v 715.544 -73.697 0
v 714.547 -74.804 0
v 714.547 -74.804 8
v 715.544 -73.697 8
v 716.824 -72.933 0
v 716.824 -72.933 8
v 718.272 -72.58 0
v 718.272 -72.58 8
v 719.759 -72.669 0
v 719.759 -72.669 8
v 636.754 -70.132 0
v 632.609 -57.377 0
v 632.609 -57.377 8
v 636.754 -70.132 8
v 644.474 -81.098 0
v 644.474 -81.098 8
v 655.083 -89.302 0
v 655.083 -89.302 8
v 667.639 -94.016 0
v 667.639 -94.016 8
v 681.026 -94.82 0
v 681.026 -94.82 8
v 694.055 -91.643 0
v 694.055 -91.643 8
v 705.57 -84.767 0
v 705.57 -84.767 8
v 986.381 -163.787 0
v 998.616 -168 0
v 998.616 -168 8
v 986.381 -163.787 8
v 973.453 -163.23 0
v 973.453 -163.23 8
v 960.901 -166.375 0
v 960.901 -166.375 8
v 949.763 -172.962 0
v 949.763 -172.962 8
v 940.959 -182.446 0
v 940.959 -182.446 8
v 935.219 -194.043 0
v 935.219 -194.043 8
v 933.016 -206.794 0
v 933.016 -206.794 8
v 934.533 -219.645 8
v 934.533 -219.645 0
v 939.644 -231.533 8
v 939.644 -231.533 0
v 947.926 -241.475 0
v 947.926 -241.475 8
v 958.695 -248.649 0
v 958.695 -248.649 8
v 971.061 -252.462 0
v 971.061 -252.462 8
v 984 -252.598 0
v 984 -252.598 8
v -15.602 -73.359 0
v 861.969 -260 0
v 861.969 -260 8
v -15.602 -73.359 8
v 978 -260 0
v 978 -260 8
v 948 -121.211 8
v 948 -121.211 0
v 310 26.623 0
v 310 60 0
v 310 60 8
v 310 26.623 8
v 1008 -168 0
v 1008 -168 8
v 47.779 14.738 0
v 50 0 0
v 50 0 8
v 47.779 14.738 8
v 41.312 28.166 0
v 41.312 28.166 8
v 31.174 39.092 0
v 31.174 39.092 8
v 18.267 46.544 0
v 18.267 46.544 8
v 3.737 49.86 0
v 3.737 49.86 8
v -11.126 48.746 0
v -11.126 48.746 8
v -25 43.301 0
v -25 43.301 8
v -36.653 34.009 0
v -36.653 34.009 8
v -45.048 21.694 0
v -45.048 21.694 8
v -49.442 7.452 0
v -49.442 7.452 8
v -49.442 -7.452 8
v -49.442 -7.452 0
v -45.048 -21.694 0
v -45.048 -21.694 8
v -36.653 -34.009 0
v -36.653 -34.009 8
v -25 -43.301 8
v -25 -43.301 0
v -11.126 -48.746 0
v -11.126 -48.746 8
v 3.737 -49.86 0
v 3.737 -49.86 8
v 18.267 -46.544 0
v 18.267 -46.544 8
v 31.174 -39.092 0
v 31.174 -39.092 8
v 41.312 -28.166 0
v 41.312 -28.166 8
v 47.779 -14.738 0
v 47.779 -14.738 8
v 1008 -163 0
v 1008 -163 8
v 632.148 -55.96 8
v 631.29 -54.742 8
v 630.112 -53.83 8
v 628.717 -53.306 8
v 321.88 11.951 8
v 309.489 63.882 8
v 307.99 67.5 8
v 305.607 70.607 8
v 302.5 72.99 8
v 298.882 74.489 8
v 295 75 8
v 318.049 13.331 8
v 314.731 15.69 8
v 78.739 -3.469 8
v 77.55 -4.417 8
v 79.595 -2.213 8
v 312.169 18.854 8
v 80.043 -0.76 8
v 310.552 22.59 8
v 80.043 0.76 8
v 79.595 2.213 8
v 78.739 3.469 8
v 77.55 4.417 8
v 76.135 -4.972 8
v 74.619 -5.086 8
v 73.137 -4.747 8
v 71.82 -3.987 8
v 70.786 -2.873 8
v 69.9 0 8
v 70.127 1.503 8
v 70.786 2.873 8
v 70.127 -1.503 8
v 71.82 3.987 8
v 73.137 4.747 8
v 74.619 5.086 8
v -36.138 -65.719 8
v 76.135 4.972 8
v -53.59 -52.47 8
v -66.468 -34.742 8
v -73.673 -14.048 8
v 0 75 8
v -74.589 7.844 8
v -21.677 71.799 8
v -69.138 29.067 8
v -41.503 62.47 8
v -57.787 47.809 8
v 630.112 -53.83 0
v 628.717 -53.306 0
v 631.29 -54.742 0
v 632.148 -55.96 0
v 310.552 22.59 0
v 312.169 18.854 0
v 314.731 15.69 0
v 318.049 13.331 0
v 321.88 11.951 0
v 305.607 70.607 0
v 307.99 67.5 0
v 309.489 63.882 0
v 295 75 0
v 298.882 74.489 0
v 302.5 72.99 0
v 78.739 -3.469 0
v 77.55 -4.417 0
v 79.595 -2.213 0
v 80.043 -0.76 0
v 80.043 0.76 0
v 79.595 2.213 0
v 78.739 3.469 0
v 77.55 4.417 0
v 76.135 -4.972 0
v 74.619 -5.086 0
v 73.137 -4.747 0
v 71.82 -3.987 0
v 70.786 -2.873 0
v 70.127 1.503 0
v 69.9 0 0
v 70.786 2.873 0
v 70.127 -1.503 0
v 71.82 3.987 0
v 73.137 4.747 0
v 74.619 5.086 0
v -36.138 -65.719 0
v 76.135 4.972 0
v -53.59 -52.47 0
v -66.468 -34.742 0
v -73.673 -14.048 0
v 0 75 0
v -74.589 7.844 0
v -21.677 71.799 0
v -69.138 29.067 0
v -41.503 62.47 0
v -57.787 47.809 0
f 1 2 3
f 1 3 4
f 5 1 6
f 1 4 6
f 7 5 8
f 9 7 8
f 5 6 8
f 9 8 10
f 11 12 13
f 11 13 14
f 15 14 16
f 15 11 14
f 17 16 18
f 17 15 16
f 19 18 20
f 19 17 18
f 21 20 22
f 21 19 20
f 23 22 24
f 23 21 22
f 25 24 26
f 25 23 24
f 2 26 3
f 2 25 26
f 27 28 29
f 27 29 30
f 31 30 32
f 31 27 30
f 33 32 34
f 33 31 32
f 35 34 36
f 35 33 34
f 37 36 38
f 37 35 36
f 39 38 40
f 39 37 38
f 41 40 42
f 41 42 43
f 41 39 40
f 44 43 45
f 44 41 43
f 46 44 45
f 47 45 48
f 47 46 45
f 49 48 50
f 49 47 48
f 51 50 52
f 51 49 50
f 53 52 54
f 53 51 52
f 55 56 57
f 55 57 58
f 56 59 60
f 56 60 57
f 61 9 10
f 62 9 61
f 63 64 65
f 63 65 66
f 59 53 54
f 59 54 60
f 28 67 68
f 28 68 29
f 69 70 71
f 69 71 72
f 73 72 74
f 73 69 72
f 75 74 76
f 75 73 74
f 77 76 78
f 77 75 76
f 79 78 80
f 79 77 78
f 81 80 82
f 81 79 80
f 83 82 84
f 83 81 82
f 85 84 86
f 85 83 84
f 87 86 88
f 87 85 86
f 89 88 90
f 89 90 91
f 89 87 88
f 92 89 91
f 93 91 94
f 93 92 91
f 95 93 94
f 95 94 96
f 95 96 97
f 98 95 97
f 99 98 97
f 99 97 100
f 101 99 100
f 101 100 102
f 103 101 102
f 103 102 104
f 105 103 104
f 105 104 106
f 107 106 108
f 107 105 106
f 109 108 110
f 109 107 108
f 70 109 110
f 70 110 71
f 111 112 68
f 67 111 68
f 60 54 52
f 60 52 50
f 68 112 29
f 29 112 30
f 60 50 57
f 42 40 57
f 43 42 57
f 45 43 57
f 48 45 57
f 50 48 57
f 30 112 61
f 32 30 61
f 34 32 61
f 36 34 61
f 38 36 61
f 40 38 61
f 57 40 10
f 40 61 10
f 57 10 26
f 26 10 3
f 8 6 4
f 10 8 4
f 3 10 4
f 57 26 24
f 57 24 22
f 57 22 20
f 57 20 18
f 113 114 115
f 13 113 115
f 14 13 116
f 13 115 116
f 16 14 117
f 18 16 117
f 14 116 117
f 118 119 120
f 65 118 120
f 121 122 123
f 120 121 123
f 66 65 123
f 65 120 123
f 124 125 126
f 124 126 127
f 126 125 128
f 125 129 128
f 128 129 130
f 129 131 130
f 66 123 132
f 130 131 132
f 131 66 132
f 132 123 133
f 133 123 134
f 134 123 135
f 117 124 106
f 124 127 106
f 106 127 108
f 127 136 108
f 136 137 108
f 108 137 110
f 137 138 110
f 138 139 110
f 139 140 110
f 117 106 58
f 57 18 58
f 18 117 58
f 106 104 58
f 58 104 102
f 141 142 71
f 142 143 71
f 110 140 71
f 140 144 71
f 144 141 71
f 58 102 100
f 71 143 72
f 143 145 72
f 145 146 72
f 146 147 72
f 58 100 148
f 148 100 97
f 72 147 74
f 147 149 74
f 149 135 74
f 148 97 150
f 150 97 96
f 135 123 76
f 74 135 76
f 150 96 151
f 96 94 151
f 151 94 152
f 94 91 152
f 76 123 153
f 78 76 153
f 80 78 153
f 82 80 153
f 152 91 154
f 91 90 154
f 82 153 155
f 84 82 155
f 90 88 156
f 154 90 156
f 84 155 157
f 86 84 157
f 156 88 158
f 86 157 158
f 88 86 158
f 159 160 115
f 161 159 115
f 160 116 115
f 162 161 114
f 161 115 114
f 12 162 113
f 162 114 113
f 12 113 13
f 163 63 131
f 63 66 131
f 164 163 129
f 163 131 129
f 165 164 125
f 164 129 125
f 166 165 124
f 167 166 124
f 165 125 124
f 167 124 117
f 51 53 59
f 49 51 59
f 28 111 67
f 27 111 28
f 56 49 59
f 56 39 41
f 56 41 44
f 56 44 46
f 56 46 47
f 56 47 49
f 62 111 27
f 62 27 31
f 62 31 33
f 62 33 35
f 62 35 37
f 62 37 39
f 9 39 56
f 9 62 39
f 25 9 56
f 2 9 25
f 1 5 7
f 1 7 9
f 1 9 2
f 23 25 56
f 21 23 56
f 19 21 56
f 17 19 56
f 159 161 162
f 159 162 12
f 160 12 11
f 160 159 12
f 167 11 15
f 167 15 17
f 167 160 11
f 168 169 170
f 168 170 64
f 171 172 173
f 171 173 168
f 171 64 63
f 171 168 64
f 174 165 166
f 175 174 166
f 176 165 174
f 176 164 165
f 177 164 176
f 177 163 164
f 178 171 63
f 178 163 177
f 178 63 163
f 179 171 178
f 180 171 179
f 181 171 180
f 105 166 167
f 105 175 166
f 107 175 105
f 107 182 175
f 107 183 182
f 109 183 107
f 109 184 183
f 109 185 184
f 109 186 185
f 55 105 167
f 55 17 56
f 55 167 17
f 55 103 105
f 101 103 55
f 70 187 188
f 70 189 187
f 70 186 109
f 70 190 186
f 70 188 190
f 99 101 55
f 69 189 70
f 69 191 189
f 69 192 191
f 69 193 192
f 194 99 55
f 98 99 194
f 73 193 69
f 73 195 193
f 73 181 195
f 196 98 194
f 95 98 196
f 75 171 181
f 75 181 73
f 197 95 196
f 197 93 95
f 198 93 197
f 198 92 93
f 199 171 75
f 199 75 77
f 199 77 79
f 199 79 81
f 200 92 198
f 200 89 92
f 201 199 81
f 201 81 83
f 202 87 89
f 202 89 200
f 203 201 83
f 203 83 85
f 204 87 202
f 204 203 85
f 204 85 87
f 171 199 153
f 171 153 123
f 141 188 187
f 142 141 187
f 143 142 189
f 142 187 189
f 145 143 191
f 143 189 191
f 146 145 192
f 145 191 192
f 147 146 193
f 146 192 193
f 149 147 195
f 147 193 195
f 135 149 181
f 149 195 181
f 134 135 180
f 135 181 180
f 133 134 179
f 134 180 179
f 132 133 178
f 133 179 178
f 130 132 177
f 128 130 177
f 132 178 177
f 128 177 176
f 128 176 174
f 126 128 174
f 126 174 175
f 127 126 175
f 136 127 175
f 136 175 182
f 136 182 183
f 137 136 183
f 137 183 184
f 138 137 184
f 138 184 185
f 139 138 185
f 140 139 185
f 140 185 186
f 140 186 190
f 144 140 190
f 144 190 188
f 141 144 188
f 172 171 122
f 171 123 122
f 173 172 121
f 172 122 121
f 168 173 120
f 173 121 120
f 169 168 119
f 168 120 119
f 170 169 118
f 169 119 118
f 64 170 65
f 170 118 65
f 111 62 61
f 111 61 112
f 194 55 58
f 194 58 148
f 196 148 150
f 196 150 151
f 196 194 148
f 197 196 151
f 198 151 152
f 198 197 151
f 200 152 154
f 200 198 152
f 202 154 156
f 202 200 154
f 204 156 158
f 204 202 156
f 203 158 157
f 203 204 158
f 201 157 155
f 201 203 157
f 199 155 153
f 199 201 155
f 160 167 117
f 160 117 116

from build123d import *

# Parameters (mm, degrees)
SKETCH_1_R          = 50
EXTRUDE_1_DEPTH     = 8
FILLET_1_R          = 15
HOLE_WIZARD_M12_1_D = 10.2
FILLET_2_R          = 5


with BuildPart() as part:
    # 草图1 → 凸台-拉伸1 (new body)
    with BuildSketch(Plane.XY):
        with BuildLine():
            Line((0, 75), (310, 75))
            Line((310, 75), (310, 14.478023217))
            Line((310, 14.478023217), (632.18201609, -54.043305358))
            ThreePointArc((632.18201609, -54.043305358), (667.638820417, -94.015546308), (716.293570548, -71.932061317))
            Line((716.293570548, -71.932061317), (948, -121.211138337))
            Line((948, -121.211138337), (1008, -163))
            Line((1008, -163), (1008, -168))
            Line((1008, -168), (998.615528128, -168))
            ThreePointArc((998.615528128, -168), (933.656897839, -200.339106398), (984, -252.598206242))
            Line((984, -252.598206242), (978, -260))
            Line((978, -260), (861.968512478, -260))
            Line((861.968512478, -260), (-15.601965972, -73.359243847))
            ThreePointArc((-15.601965972, -73.359243847), (-74.588683084, 7.844001258), (0, 75))
        make_face()
        Circle(SKETCH_1_R, mode=Mode.SUBTRACT)
    extrude(amount=EXTRUDE_1_DEPTH)

    # 圆角1
    fillet_1_edges = [part.edges().sort_by_distance(p)[0] for p in [
        (310, 75, 4),
        (310, 14.478023217, 4),
    ]]
    fillet(fillet_1_edges, radius=FILLET_1_R)

    # M12 螺纹孔1 (through all)
    with Locations(Plane.XY.offset(8)):
        with Locations((75, 0)):
            Hole(HOLE_WIZARD_M12_1_D / 2)

    # 圆角2
    fillet_2_edges = [part.edges().sort_by_distance(p)[0] for p in [
        (632.18201609, -54.043305358, 4),
        (716.293570548, -71.932061317, 4),
    ]]
    fillet(fillet_2_edges, radius=FILLET_2_R)


solid = part.part
